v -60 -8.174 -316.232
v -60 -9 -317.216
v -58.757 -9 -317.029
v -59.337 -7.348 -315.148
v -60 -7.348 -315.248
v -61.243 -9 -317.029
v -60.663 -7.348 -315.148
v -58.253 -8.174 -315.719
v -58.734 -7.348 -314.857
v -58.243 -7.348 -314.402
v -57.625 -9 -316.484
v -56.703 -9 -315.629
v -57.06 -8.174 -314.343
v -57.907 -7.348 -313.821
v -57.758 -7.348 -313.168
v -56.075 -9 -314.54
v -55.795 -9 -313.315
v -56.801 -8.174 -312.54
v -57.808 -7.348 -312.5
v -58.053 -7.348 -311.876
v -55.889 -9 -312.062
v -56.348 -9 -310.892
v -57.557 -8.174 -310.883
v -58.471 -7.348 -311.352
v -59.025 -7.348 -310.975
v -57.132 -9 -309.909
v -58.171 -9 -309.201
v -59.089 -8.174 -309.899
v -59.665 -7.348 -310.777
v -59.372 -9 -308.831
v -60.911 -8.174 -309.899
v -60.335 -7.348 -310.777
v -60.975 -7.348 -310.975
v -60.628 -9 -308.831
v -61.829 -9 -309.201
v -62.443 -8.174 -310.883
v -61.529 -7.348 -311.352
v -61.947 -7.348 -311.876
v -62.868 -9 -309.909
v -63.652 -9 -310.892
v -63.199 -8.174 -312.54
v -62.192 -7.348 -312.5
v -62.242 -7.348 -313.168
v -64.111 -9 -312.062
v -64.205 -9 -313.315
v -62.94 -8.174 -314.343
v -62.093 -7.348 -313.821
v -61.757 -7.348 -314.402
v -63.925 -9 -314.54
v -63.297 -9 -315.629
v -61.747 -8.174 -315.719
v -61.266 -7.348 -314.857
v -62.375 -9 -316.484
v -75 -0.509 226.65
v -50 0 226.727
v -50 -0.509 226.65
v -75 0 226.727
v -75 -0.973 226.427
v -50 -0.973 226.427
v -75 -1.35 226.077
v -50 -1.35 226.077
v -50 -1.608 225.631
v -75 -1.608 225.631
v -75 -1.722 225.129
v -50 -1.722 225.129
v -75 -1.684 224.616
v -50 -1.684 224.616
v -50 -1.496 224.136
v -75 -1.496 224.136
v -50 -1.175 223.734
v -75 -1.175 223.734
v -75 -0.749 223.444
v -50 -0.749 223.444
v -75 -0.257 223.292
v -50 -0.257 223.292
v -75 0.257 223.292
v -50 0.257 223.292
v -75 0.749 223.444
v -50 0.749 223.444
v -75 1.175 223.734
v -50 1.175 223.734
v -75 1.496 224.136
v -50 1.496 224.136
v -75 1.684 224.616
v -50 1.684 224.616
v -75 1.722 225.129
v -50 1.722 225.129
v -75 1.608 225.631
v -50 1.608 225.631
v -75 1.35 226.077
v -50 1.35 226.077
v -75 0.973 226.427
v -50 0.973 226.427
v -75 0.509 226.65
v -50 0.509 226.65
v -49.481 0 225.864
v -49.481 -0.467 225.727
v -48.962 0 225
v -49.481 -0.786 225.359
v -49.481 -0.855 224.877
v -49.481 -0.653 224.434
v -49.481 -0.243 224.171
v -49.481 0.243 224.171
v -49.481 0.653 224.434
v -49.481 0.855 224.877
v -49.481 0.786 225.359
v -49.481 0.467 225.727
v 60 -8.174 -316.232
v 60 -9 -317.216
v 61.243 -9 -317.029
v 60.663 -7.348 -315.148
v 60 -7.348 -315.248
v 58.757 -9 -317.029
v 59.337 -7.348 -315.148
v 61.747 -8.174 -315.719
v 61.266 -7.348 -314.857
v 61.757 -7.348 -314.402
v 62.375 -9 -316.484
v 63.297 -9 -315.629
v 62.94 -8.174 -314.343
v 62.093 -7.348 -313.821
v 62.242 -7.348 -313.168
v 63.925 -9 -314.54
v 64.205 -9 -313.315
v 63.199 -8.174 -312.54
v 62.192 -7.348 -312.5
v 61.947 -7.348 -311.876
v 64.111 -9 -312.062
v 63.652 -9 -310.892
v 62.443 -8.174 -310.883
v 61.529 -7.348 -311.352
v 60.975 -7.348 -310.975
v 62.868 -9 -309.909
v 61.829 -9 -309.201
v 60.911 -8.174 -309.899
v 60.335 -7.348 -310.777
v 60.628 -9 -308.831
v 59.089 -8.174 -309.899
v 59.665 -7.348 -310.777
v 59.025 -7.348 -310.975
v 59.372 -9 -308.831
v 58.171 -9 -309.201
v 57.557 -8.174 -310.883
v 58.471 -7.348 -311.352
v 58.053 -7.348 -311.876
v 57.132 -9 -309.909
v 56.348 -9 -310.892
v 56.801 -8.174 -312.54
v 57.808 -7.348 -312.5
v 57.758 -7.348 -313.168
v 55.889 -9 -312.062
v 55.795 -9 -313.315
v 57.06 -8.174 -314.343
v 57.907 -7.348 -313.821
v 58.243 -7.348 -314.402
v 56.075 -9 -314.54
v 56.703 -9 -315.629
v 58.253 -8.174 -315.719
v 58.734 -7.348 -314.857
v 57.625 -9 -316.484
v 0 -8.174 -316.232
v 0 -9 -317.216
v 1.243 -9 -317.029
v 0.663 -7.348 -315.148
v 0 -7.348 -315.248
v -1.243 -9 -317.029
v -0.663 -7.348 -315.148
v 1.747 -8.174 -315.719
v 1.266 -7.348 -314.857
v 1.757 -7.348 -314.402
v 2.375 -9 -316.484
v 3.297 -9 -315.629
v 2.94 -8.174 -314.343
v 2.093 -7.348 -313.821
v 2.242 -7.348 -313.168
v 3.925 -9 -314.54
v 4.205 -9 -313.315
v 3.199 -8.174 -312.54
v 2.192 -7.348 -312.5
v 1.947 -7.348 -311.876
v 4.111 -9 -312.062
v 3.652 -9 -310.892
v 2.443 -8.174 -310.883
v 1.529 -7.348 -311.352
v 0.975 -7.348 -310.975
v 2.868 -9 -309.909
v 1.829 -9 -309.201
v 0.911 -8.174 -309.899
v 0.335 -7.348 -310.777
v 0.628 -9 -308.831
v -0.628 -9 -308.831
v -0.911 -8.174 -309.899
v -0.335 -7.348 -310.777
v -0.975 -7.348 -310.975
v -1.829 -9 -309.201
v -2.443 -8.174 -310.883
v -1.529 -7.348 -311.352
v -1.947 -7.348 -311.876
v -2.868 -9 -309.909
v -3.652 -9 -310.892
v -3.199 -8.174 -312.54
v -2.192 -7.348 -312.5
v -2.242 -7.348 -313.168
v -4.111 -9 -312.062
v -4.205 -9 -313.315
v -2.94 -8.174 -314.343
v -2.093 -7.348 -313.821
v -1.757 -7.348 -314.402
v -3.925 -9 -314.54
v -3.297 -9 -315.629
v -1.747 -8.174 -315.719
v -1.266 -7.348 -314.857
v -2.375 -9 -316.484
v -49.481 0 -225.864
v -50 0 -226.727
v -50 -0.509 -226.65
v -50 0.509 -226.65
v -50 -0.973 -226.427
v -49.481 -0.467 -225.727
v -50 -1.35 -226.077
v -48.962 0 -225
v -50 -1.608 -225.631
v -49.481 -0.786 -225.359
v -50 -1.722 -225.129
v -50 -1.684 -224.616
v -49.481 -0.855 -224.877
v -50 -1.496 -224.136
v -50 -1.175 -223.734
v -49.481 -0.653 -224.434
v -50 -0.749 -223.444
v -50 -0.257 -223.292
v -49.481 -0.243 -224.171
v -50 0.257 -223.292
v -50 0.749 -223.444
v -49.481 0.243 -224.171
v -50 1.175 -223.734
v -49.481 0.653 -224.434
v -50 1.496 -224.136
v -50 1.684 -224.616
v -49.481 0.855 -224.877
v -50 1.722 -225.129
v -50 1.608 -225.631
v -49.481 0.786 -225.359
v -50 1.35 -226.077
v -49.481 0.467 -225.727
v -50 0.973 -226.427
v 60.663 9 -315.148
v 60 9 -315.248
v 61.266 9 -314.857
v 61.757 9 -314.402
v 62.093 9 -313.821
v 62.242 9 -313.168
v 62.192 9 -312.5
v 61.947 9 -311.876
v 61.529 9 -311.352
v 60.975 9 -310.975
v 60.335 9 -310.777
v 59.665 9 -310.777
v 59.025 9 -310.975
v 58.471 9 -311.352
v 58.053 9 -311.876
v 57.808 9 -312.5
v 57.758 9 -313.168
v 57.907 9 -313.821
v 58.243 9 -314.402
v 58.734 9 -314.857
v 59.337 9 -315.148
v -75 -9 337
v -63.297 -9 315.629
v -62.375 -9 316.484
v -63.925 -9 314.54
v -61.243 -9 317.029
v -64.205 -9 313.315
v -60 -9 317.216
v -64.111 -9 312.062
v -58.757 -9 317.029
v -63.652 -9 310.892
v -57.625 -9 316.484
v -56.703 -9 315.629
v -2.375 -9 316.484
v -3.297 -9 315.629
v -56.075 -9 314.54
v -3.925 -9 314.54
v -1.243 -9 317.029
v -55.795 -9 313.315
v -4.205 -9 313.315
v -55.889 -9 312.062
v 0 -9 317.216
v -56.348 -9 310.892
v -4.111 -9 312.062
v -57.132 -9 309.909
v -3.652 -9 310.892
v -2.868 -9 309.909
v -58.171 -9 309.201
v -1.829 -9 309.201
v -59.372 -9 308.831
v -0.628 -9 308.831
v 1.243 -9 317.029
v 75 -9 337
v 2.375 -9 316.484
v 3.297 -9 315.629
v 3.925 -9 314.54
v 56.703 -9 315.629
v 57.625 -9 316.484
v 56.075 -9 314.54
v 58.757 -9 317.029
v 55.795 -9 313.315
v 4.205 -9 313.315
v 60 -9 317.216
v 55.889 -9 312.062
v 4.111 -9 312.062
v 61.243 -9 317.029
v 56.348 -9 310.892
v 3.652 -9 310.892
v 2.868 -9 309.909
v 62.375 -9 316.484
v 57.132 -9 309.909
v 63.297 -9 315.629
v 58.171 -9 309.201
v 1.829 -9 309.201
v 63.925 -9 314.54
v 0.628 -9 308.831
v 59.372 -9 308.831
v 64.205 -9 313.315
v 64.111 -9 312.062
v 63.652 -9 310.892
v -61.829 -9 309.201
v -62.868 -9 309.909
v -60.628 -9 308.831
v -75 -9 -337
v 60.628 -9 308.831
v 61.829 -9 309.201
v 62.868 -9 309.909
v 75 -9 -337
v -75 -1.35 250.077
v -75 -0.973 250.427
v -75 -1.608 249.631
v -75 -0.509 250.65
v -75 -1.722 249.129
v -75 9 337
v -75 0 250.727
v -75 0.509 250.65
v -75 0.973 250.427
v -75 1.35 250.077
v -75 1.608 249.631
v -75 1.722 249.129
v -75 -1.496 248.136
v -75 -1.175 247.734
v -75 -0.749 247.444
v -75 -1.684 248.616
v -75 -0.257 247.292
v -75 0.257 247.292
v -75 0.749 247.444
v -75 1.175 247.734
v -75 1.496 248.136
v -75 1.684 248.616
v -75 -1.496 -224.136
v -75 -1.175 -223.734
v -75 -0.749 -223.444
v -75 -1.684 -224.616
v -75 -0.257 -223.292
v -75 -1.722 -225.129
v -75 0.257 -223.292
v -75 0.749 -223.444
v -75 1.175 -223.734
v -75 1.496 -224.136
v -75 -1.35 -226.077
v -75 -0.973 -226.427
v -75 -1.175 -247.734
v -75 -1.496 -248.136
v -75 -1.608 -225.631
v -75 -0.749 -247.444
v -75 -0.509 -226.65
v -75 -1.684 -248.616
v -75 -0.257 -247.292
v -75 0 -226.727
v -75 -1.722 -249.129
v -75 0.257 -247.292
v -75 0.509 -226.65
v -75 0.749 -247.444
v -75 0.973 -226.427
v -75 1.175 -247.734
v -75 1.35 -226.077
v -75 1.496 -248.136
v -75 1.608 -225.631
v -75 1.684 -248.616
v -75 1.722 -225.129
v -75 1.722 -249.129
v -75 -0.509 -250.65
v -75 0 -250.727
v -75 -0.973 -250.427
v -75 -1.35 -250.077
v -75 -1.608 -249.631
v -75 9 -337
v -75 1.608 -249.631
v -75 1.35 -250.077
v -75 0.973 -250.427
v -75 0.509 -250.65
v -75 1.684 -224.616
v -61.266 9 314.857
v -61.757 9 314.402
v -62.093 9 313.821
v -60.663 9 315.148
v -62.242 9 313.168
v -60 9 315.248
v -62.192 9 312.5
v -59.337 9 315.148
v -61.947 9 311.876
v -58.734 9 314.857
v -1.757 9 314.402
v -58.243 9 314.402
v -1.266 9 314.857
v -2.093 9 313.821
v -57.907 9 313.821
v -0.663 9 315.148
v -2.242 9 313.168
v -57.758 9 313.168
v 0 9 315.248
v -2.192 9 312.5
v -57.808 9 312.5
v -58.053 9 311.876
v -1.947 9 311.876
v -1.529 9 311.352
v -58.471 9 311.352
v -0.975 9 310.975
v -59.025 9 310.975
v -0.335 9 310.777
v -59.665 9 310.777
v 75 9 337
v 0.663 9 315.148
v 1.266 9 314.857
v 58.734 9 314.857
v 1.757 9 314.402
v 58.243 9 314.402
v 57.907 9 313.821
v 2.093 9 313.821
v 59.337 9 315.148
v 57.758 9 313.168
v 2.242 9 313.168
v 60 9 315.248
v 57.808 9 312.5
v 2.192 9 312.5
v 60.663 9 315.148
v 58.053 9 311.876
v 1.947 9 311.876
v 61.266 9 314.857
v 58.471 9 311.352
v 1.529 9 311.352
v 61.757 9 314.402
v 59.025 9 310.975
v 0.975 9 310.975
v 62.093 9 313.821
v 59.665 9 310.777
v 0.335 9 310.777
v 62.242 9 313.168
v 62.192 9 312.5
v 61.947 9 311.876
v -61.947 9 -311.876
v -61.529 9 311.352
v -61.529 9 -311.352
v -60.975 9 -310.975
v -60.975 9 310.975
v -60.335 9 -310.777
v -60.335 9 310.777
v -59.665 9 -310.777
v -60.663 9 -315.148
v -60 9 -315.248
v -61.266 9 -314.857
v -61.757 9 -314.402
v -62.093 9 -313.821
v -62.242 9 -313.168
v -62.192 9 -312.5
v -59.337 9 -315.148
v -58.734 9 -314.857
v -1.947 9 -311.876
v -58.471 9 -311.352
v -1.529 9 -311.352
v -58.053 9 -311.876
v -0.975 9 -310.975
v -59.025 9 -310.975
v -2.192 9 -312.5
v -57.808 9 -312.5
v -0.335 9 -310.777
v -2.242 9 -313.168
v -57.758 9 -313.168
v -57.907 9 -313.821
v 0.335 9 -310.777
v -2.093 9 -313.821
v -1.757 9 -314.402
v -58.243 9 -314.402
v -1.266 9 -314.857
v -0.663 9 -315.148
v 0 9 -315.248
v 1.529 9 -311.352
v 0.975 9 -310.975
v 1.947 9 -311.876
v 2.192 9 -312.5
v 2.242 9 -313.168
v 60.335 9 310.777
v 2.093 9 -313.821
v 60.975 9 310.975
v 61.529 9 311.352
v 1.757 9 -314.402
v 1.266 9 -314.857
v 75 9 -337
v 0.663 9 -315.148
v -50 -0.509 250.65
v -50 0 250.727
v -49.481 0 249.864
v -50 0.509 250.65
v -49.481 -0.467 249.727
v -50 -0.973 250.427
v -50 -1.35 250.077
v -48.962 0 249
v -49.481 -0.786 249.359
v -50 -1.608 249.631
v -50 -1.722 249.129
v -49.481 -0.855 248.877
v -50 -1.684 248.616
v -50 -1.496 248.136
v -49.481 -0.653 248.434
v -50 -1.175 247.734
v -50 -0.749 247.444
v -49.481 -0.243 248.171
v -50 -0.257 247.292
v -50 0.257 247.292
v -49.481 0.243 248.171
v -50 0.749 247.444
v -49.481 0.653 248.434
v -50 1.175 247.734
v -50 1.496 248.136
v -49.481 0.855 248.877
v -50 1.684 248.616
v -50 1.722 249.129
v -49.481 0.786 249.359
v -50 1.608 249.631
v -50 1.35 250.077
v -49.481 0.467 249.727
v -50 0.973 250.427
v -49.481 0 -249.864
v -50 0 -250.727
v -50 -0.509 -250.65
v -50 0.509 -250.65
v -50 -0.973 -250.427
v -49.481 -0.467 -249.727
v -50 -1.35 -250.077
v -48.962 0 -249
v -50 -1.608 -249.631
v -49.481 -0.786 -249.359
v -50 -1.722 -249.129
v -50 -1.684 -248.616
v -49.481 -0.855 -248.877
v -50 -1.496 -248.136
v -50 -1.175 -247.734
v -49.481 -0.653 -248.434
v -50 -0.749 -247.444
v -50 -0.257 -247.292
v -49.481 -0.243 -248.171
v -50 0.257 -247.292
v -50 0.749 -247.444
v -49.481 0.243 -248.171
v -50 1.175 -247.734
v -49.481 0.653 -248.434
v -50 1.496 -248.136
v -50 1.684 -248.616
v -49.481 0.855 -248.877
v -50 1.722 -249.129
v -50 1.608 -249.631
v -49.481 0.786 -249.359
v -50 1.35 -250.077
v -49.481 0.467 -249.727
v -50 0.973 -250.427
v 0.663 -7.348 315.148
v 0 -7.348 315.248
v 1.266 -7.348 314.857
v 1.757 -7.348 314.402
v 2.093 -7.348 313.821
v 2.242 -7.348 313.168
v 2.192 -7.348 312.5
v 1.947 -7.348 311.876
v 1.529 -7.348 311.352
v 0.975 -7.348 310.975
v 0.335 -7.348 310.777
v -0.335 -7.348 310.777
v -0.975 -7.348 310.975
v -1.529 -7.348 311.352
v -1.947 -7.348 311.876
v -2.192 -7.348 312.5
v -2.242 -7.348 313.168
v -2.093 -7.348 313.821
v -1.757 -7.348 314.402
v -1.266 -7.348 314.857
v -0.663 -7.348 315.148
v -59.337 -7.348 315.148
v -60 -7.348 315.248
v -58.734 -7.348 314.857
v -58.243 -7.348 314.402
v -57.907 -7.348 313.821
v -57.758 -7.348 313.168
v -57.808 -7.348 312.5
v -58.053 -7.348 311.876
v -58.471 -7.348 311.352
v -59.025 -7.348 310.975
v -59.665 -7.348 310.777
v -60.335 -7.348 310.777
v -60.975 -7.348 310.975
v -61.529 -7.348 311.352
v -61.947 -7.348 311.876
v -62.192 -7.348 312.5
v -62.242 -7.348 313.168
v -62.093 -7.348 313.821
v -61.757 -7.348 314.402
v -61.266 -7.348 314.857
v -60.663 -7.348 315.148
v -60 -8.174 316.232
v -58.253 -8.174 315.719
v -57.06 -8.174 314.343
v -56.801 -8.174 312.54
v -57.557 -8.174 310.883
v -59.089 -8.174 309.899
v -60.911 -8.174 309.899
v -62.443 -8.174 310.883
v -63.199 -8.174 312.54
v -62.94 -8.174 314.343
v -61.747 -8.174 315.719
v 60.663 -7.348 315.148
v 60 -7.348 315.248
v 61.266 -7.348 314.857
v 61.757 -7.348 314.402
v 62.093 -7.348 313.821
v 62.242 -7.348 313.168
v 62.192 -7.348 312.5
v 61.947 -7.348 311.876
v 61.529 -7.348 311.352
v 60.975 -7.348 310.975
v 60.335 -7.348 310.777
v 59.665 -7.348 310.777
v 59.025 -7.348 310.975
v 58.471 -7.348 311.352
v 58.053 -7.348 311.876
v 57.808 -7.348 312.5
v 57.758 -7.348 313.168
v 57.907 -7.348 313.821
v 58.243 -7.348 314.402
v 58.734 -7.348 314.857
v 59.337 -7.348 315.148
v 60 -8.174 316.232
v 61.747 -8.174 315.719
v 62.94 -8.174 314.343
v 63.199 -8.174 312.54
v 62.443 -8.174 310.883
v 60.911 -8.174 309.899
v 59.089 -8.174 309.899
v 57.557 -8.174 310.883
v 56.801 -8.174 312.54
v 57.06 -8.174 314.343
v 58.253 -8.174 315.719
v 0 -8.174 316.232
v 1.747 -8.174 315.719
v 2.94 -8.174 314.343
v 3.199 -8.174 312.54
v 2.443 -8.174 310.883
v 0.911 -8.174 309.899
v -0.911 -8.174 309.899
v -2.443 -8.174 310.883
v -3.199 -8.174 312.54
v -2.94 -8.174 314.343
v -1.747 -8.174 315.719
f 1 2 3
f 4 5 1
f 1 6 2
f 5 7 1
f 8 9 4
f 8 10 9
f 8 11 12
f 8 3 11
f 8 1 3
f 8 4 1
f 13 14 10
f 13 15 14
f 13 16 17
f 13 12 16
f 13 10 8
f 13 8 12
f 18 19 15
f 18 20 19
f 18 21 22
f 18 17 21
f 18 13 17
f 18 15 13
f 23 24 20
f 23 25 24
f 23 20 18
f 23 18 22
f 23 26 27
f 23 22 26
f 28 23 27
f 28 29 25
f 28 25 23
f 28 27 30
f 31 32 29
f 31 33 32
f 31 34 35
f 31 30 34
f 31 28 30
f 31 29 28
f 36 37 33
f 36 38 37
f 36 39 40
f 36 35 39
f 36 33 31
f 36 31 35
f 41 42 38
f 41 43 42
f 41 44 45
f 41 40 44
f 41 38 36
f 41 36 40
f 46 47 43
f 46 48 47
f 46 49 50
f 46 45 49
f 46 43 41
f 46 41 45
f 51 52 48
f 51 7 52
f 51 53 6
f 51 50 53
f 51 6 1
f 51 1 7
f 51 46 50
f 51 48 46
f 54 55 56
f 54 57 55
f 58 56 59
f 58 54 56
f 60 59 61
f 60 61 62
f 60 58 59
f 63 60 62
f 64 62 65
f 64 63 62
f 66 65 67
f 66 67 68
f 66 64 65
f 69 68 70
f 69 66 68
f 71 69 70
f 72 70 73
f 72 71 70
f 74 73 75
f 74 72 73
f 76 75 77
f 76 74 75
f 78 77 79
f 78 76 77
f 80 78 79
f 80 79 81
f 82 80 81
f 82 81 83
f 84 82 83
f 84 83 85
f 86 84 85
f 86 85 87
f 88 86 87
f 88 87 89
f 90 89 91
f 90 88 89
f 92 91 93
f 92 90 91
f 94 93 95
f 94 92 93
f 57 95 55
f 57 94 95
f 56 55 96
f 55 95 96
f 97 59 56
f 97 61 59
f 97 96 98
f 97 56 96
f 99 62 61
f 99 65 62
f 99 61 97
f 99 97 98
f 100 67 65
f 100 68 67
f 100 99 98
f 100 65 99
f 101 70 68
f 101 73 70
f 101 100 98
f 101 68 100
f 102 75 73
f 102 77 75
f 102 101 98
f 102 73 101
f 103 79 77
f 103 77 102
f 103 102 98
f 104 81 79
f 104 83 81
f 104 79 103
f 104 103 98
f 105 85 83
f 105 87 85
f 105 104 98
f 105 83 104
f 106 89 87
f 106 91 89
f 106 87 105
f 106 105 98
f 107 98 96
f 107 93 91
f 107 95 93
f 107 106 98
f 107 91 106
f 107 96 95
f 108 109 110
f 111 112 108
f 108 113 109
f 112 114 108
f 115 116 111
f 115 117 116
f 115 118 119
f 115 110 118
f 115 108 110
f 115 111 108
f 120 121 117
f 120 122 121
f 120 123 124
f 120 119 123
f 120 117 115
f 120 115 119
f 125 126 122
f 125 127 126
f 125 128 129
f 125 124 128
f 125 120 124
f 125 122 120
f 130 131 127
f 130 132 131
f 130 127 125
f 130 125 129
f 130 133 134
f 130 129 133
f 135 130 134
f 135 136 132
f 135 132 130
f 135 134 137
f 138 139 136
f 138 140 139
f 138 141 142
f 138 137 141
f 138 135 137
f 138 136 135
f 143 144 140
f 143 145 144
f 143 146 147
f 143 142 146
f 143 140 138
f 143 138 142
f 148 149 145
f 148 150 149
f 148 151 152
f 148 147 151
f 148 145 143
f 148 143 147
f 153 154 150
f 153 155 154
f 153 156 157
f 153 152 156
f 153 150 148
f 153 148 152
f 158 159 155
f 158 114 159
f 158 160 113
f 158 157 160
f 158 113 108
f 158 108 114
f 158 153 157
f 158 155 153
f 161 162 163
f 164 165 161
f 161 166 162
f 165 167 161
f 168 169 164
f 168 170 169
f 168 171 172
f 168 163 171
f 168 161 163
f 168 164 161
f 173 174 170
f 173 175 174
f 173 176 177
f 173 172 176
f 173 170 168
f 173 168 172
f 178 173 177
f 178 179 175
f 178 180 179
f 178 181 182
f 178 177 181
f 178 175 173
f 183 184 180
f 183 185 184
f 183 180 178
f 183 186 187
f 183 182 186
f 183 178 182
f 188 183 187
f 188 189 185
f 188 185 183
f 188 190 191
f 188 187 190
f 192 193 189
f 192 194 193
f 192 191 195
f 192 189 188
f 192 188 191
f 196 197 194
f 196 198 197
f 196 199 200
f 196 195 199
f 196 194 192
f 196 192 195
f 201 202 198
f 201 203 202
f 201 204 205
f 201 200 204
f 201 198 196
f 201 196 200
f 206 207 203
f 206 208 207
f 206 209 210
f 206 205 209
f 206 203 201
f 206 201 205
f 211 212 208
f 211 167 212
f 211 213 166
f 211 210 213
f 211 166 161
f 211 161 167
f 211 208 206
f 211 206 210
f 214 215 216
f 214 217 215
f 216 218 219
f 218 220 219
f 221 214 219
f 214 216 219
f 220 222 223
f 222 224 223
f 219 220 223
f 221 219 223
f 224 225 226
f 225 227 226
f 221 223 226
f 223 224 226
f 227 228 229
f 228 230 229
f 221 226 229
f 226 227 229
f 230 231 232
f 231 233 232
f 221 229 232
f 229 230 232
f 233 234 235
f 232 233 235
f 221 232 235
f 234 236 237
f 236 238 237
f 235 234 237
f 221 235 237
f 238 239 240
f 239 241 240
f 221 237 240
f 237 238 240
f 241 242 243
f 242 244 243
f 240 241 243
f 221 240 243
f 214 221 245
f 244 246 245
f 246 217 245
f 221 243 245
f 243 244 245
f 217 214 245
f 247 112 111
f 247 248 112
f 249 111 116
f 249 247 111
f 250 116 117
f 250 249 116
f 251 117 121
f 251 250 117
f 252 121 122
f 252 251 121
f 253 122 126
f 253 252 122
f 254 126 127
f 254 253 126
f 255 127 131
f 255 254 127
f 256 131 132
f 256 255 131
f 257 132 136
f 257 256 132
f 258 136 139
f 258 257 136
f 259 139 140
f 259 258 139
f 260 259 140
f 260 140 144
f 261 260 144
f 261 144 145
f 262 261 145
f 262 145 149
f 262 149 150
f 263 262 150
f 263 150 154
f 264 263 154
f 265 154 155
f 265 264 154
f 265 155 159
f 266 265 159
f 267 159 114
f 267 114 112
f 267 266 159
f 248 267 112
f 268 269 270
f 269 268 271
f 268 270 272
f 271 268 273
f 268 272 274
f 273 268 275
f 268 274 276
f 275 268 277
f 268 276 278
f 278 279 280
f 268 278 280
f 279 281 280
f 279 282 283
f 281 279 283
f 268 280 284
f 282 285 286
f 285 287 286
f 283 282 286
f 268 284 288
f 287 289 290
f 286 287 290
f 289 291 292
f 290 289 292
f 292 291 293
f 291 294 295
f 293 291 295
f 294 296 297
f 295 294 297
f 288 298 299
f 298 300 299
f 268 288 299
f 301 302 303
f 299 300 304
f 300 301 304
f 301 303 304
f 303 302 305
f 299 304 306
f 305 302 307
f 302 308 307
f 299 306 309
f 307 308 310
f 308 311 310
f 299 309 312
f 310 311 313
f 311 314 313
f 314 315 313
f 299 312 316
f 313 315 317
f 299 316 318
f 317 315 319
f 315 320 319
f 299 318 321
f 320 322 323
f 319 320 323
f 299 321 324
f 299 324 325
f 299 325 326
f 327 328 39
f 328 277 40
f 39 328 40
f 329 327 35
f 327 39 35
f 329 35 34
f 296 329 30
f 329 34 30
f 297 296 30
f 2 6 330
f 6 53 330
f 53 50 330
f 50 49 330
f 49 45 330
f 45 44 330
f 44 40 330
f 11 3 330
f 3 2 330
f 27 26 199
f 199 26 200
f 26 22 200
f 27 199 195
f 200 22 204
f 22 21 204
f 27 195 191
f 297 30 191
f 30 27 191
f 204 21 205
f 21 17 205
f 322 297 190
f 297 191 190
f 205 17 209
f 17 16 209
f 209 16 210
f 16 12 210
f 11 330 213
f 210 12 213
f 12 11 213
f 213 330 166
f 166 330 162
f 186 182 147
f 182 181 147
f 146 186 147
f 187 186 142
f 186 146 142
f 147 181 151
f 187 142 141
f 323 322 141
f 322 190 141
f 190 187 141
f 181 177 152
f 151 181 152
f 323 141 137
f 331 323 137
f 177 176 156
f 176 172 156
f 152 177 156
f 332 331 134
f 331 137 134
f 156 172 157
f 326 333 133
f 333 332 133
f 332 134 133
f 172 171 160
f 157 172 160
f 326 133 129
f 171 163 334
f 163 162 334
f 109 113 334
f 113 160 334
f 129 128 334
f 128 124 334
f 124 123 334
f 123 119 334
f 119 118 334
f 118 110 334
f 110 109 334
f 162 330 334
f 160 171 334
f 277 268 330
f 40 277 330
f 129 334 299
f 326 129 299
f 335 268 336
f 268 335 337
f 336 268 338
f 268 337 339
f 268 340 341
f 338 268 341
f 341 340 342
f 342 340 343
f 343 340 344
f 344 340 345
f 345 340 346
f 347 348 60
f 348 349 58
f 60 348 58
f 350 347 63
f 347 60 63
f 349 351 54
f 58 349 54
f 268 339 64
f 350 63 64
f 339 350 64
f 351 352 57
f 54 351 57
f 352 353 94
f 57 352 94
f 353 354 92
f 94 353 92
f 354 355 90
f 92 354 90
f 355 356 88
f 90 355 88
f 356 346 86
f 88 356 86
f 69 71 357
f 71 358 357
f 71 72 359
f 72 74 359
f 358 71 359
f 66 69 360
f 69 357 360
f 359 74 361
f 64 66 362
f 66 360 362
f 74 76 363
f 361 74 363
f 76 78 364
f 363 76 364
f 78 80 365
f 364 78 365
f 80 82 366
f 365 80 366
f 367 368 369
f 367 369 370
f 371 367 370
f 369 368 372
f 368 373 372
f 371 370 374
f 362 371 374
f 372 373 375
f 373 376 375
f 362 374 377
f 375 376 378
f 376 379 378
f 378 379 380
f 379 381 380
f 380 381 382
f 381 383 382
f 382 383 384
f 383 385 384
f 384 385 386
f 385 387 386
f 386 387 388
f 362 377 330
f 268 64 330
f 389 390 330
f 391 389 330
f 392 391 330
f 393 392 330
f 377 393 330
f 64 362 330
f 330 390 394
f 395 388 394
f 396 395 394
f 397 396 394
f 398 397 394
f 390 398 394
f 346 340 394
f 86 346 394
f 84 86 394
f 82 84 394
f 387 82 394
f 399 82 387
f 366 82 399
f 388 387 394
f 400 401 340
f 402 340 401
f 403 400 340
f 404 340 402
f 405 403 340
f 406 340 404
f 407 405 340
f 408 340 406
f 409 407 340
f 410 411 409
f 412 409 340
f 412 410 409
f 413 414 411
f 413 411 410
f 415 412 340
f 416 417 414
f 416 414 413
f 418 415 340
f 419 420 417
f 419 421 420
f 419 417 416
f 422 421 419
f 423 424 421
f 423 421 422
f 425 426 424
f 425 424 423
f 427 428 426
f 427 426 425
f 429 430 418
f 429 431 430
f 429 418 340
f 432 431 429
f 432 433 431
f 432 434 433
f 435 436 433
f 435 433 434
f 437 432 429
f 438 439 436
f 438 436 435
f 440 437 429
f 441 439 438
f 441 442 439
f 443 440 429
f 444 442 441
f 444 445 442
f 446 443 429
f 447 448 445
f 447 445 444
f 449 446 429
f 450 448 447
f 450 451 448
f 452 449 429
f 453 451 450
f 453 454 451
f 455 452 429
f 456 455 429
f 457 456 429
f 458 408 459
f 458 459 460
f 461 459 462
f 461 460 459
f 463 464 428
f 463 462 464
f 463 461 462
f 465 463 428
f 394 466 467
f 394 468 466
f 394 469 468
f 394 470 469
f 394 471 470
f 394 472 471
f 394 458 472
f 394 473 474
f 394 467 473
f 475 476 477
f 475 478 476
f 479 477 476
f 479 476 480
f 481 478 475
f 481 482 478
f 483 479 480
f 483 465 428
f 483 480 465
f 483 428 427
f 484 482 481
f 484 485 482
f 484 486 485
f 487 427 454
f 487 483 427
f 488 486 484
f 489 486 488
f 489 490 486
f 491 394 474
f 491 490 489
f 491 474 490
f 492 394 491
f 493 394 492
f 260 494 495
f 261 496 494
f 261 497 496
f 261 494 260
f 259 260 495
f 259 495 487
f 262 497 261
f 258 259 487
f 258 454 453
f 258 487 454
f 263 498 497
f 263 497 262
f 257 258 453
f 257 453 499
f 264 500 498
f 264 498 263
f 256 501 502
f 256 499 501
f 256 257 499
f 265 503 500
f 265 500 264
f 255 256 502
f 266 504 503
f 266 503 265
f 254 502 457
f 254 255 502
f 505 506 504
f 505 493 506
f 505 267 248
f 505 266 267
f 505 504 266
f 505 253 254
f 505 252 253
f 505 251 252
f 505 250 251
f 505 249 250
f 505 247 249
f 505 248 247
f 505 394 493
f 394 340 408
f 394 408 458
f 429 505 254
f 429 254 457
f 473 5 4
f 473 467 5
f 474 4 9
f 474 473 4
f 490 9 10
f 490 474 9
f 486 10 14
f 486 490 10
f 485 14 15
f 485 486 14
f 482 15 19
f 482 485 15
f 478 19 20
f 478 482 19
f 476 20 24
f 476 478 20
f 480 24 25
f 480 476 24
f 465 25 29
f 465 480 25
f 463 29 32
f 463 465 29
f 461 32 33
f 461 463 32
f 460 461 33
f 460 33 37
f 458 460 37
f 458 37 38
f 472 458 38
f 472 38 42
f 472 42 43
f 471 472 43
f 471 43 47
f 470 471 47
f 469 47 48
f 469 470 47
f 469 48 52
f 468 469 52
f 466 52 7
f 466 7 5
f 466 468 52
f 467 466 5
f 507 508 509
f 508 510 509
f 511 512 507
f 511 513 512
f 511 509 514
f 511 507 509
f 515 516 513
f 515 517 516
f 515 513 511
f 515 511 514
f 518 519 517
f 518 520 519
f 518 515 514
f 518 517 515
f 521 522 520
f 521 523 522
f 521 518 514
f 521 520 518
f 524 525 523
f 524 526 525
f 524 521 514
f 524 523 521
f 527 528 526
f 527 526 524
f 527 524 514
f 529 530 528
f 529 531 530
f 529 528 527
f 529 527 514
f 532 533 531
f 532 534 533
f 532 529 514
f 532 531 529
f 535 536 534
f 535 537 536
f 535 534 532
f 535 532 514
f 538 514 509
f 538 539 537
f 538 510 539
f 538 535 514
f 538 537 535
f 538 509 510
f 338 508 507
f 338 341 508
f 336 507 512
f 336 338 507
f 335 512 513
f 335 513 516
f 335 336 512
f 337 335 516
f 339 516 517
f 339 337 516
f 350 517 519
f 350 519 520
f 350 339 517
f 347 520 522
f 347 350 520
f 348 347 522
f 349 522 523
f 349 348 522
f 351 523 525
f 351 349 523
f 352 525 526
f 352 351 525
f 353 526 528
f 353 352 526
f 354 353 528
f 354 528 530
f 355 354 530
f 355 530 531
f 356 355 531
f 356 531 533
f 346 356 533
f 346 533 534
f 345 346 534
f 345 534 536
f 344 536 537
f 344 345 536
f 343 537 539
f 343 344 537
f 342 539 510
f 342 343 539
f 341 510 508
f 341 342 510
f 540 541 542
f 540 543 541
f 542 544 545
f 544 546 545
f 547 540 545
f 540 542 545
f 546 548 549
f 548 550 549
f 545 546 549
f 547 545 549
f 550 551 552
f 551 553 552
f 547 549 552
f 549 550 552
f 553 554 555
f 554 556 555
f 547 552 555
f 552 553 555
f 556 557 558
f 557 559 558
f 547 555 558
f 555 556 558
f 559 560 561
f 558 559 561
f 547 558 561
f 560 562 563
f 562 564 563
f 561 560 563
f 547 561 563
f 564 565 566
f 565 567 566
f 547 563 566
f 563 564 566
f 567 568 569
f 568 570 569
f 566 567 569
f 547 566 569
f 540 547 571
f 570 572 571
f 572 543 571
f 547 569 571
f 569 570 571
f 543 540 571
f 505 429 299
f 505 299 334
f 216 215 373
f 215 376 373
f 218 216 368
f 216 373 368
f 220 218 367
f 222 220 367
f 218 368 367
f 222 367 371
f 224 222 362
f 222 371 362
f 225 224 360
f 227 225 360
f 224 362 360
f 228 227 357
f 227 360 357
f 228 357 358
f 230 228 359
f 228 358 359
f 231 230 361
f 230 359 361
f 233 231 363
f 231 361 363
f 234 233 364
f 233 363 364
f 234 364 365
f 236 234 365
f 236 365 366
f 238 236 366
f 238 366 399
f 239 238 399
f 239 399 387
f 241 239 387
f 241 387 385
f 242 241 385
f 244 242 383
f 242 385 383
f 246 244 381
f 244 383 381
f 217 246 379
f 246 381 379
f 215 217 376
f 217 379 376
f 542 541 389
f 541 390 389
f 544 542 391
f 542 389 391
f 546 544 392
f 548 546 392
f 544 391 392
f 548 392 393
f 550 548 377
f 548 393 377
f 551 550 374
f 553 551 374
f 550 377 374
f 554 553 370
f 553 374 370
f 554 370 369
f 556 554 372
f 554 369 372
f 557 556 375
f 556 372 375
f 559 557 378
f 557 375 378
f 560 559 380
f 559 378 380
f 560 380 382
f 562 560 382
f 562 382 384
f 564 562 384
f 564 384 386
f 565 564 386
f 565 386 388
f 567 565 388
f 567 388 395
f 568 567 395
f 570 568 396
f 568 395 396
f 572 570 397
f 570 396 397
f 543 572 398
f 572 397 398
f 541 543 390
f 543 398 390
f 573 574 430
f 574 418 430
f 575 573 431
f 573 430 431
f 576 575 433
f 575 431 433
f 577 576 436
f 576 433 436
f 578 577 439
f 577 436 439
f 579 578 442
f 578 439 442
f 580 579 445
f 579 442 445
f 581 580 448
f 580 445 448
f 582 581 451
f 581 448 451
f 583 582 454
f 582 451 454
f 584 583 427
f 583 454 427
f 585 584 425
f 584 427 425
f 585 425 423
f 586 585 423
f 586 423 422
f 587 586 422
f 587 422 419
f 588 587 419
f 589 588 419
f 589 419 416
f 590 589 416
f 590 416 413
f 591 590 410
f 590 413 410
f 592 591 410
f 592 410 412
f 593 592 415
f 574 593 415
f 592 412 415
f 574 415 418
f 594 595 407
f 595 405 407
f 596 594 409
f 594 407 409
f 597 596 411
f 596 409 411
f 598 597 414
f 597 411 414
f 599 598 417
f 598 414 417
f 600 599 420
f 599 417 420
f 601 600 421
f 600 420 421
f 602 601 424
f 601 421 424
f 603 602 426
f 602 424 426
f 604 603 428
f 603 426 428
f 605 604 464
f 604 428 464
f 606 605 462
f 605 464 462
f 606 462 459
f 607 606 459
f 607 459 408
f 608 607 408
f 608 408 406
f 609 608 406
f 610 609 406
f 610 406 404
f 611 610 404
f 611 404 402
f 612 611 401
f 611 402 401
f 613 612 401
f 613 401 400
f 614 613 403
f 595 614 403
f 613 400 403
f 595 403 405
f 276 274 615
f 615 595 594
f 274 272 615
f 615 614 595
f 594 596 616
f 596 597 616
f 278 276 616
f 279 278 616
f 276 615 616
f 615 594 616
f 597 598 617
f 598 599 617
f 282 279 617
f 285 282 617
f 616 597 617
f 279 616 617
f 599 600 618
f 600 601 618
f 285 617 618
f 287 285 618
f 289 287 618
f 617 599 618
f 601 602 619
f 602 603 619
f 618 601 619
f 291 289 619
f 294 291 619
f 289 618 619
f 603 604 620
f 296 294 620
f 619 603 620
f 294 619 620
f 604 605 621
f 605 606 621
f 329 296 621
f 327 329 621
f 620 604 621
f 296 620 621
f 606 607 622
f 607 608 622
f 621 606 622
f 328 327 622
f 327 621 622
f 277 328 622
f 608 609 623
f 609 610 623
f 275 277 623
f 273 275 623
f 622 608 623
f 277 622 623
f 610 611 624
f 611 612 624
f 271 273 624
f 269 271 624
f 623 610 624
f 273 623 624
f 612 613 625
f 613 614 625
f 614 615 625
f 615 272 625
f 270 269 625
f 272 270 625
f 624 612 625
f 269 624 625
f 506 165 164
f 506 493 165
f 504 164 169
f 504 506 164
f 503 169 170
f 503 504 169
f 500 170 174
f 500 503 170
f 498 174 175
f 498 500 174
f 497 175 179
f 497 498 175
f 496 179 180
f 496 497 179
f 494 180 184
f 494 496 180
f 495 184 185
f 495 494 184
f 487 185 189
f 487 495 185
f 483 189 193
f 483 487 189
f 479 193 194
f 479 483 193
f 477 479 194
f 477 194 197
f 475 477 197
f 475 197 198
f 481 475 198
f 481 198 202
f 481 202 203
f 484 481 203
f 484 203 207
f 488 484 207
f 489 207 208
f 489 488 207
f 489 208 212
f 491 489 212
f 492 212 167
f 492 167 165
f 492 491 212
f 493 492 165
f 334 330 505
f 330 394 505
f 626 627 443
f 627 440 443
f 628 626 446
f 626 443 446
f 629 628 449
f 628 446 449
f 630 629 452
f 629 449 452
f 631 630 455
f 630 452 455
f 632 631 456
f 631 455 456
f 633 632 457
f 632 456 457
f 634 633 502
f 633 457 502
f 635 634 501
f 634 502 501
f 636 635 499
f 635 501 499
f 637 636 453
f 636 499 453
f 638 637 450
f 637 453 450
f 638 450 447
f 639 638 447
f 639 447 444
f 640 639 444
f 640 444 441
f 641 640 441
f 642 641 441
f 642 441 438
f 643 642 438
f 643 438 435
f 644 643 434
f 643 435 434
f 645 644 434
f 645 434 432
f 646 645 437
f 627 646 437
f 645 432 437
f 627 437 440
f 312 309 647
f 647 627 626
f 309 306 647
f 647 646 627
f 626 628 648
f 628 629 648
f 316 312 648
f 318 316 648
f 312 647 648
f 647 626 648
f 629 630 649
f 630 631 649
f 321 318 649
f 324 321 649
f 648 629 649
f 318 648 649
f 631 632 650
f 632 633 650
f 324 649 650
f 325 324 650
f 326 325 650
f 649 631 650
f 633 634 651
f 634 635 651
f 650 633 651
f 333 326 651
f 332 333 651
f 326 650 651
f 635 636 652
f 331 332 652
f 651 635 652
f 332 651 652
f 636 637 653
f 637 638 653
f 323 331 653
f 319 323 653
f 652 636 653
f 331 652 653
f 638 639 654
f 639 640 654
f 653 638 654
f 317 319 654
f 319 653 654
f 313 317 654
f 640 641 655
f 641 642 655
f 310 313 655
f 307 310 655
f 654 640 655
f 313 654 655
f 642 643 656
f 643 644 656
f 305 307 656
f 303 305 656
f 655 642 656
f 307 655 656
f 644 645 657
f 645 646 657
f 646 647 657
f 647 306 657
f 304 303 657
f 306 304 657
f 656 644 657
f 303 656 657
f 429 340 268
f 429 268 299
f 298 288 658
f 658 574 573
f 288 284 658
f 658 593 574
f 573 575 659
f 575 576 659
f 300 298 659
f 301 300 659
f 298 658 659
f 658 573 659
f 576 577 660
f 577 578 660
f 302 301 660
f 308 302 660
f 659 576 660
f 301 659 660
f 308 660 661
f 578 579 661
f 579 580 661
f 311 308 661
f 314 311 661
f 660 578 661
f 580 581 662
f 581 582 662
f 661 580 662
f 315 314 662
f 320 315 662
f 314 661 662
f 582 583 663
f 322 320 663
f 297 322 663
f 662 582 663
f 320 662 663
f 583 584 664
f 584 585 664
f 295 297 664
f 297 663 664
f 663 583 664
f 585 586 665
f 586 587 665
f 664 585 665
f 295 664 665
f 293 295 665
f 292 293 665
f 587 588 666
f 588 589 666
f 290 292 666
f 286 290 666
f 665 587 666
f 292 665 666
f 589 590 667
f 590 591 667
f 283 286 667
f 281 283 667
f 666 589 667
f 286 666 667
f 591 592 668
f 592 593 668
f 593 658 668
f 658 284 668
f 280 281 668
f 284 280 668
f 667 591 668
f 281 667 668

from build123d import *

# Parameters (mm, degrees)
SKETCH1_W                                         = 150
SKETCH1_H                                         = 674
BOSS_EXTRUDE1_DEPTH                               = 9
CSK_FOR_8_FLAT_HEAD_MACHINE_SCREW_100_D           = 4.4958
CSK_FOR_8_FLAT_HEAD_MACHINE_SCREW_100_CSINK_D     = 8.4328
CSK_FOR_8_FLAT_HEAD_MACHINE_SCREW_100_CSINK_ANGLE = 100
F_8_36_TAPPED_HOLE1_AT_2_COUNT                    = 2
F_8_36_TAPPED_HOLE1_AT_2_PITCH                    = 24


with BuildPart() as part:
    # Sketch1 → Boss-Extrude1 (new, symmetric)
    with BuildSketch(Plane(origin=(0, 0, 0), x_dir=(1, 0, 0), z_dir=(0, 1, 0))):
        Rectangle(SKETCH1_W, SKETCH1_H)
    extrude(amount=BOSS_EXTRUDE1_DEPTH, both=True)

    # CSK for #8 Flat Head Machine Screw (100)1 (through all)
    with Locations(Plane(origin=(-75, -9, 0), x_dir=(0, 0, -1), z_dir=(0, -1, 0))):
        with Locations((-313, 135), (-313, 75), (-313, 15)):
            csk_for_8_flat_head_machine_screw_100 = CounterSinkHole(CSK_FOR_8_FLAT_HEAD_MACHINE_SCREW_100_D / 2, CSK_FOR_8_FLAT_HEAD_MACHINE_SCREW_100_CSINK_D / 2, counter_sink_angle=CSK_FOR_8_FLAT_HEAD_MACHINE_SCREW_100_CSINK_ANGLE)

    # Sketch5 → #8-36 Tapped Hole1 (revolve, cut)
    with BuildSketch(Plane(origin=(-75, 0, 249), x_dir=(0, 0, 1), z_dir=(0, 1, 0))):
        Polygon((0, 0), (0, 26.037806461), (1.7272, 25), (1.7272, 0), align=None)
    f_8_36_tapped_hole1 = revolve(axis=Axis((-81.35, 0, 249), (1, 0, 0)), mode=Mode.SUBTRACT)

    # #8-36 Tapped Hole1 at 2: #8-36 Tapped Hole1 ×2
    with Locations(*[(0, 0, -i * F_8_36_TAPPED_HOLE1_AT_2_PITCH) for i in range(1, F_8_36_TAPPED_HOLE1_AT_2_COUNT)]):
        add(f_8_36_tapped_hole1, mode=Mode.SUBTRACT)

    # Mirror1: CSK for #8 Flat Head Machine Screw (100)1, #8-36 Tapped Hole1 across plane
    add(csk_for_8_flat_head_machine_screw_100.mirror(Plane.XY), mode=Mode.SUBTRACT)
    add(f_8_36_tapped_hole1.mirror(Plane.XY), mode=Mode.SUBTRACT)

    # Mirror1 copy 1 sketch → Mirror1 copy 1 (revolve, cut)
    with BuildSketch(Plane(origin=(-75, 0, -225), x_dir=(0, 0, -1), z_dir=(0, 1, 0))):
        Polygon((0, 0), (0, -26.037806461), (1.7272, -25), (1.7272, 0), align=None)
    revolve(axis=Axis((-81.35, 0, -225), (-1, 0, 0)), mode=Mode.SUBTRACT)


solid = part.part
